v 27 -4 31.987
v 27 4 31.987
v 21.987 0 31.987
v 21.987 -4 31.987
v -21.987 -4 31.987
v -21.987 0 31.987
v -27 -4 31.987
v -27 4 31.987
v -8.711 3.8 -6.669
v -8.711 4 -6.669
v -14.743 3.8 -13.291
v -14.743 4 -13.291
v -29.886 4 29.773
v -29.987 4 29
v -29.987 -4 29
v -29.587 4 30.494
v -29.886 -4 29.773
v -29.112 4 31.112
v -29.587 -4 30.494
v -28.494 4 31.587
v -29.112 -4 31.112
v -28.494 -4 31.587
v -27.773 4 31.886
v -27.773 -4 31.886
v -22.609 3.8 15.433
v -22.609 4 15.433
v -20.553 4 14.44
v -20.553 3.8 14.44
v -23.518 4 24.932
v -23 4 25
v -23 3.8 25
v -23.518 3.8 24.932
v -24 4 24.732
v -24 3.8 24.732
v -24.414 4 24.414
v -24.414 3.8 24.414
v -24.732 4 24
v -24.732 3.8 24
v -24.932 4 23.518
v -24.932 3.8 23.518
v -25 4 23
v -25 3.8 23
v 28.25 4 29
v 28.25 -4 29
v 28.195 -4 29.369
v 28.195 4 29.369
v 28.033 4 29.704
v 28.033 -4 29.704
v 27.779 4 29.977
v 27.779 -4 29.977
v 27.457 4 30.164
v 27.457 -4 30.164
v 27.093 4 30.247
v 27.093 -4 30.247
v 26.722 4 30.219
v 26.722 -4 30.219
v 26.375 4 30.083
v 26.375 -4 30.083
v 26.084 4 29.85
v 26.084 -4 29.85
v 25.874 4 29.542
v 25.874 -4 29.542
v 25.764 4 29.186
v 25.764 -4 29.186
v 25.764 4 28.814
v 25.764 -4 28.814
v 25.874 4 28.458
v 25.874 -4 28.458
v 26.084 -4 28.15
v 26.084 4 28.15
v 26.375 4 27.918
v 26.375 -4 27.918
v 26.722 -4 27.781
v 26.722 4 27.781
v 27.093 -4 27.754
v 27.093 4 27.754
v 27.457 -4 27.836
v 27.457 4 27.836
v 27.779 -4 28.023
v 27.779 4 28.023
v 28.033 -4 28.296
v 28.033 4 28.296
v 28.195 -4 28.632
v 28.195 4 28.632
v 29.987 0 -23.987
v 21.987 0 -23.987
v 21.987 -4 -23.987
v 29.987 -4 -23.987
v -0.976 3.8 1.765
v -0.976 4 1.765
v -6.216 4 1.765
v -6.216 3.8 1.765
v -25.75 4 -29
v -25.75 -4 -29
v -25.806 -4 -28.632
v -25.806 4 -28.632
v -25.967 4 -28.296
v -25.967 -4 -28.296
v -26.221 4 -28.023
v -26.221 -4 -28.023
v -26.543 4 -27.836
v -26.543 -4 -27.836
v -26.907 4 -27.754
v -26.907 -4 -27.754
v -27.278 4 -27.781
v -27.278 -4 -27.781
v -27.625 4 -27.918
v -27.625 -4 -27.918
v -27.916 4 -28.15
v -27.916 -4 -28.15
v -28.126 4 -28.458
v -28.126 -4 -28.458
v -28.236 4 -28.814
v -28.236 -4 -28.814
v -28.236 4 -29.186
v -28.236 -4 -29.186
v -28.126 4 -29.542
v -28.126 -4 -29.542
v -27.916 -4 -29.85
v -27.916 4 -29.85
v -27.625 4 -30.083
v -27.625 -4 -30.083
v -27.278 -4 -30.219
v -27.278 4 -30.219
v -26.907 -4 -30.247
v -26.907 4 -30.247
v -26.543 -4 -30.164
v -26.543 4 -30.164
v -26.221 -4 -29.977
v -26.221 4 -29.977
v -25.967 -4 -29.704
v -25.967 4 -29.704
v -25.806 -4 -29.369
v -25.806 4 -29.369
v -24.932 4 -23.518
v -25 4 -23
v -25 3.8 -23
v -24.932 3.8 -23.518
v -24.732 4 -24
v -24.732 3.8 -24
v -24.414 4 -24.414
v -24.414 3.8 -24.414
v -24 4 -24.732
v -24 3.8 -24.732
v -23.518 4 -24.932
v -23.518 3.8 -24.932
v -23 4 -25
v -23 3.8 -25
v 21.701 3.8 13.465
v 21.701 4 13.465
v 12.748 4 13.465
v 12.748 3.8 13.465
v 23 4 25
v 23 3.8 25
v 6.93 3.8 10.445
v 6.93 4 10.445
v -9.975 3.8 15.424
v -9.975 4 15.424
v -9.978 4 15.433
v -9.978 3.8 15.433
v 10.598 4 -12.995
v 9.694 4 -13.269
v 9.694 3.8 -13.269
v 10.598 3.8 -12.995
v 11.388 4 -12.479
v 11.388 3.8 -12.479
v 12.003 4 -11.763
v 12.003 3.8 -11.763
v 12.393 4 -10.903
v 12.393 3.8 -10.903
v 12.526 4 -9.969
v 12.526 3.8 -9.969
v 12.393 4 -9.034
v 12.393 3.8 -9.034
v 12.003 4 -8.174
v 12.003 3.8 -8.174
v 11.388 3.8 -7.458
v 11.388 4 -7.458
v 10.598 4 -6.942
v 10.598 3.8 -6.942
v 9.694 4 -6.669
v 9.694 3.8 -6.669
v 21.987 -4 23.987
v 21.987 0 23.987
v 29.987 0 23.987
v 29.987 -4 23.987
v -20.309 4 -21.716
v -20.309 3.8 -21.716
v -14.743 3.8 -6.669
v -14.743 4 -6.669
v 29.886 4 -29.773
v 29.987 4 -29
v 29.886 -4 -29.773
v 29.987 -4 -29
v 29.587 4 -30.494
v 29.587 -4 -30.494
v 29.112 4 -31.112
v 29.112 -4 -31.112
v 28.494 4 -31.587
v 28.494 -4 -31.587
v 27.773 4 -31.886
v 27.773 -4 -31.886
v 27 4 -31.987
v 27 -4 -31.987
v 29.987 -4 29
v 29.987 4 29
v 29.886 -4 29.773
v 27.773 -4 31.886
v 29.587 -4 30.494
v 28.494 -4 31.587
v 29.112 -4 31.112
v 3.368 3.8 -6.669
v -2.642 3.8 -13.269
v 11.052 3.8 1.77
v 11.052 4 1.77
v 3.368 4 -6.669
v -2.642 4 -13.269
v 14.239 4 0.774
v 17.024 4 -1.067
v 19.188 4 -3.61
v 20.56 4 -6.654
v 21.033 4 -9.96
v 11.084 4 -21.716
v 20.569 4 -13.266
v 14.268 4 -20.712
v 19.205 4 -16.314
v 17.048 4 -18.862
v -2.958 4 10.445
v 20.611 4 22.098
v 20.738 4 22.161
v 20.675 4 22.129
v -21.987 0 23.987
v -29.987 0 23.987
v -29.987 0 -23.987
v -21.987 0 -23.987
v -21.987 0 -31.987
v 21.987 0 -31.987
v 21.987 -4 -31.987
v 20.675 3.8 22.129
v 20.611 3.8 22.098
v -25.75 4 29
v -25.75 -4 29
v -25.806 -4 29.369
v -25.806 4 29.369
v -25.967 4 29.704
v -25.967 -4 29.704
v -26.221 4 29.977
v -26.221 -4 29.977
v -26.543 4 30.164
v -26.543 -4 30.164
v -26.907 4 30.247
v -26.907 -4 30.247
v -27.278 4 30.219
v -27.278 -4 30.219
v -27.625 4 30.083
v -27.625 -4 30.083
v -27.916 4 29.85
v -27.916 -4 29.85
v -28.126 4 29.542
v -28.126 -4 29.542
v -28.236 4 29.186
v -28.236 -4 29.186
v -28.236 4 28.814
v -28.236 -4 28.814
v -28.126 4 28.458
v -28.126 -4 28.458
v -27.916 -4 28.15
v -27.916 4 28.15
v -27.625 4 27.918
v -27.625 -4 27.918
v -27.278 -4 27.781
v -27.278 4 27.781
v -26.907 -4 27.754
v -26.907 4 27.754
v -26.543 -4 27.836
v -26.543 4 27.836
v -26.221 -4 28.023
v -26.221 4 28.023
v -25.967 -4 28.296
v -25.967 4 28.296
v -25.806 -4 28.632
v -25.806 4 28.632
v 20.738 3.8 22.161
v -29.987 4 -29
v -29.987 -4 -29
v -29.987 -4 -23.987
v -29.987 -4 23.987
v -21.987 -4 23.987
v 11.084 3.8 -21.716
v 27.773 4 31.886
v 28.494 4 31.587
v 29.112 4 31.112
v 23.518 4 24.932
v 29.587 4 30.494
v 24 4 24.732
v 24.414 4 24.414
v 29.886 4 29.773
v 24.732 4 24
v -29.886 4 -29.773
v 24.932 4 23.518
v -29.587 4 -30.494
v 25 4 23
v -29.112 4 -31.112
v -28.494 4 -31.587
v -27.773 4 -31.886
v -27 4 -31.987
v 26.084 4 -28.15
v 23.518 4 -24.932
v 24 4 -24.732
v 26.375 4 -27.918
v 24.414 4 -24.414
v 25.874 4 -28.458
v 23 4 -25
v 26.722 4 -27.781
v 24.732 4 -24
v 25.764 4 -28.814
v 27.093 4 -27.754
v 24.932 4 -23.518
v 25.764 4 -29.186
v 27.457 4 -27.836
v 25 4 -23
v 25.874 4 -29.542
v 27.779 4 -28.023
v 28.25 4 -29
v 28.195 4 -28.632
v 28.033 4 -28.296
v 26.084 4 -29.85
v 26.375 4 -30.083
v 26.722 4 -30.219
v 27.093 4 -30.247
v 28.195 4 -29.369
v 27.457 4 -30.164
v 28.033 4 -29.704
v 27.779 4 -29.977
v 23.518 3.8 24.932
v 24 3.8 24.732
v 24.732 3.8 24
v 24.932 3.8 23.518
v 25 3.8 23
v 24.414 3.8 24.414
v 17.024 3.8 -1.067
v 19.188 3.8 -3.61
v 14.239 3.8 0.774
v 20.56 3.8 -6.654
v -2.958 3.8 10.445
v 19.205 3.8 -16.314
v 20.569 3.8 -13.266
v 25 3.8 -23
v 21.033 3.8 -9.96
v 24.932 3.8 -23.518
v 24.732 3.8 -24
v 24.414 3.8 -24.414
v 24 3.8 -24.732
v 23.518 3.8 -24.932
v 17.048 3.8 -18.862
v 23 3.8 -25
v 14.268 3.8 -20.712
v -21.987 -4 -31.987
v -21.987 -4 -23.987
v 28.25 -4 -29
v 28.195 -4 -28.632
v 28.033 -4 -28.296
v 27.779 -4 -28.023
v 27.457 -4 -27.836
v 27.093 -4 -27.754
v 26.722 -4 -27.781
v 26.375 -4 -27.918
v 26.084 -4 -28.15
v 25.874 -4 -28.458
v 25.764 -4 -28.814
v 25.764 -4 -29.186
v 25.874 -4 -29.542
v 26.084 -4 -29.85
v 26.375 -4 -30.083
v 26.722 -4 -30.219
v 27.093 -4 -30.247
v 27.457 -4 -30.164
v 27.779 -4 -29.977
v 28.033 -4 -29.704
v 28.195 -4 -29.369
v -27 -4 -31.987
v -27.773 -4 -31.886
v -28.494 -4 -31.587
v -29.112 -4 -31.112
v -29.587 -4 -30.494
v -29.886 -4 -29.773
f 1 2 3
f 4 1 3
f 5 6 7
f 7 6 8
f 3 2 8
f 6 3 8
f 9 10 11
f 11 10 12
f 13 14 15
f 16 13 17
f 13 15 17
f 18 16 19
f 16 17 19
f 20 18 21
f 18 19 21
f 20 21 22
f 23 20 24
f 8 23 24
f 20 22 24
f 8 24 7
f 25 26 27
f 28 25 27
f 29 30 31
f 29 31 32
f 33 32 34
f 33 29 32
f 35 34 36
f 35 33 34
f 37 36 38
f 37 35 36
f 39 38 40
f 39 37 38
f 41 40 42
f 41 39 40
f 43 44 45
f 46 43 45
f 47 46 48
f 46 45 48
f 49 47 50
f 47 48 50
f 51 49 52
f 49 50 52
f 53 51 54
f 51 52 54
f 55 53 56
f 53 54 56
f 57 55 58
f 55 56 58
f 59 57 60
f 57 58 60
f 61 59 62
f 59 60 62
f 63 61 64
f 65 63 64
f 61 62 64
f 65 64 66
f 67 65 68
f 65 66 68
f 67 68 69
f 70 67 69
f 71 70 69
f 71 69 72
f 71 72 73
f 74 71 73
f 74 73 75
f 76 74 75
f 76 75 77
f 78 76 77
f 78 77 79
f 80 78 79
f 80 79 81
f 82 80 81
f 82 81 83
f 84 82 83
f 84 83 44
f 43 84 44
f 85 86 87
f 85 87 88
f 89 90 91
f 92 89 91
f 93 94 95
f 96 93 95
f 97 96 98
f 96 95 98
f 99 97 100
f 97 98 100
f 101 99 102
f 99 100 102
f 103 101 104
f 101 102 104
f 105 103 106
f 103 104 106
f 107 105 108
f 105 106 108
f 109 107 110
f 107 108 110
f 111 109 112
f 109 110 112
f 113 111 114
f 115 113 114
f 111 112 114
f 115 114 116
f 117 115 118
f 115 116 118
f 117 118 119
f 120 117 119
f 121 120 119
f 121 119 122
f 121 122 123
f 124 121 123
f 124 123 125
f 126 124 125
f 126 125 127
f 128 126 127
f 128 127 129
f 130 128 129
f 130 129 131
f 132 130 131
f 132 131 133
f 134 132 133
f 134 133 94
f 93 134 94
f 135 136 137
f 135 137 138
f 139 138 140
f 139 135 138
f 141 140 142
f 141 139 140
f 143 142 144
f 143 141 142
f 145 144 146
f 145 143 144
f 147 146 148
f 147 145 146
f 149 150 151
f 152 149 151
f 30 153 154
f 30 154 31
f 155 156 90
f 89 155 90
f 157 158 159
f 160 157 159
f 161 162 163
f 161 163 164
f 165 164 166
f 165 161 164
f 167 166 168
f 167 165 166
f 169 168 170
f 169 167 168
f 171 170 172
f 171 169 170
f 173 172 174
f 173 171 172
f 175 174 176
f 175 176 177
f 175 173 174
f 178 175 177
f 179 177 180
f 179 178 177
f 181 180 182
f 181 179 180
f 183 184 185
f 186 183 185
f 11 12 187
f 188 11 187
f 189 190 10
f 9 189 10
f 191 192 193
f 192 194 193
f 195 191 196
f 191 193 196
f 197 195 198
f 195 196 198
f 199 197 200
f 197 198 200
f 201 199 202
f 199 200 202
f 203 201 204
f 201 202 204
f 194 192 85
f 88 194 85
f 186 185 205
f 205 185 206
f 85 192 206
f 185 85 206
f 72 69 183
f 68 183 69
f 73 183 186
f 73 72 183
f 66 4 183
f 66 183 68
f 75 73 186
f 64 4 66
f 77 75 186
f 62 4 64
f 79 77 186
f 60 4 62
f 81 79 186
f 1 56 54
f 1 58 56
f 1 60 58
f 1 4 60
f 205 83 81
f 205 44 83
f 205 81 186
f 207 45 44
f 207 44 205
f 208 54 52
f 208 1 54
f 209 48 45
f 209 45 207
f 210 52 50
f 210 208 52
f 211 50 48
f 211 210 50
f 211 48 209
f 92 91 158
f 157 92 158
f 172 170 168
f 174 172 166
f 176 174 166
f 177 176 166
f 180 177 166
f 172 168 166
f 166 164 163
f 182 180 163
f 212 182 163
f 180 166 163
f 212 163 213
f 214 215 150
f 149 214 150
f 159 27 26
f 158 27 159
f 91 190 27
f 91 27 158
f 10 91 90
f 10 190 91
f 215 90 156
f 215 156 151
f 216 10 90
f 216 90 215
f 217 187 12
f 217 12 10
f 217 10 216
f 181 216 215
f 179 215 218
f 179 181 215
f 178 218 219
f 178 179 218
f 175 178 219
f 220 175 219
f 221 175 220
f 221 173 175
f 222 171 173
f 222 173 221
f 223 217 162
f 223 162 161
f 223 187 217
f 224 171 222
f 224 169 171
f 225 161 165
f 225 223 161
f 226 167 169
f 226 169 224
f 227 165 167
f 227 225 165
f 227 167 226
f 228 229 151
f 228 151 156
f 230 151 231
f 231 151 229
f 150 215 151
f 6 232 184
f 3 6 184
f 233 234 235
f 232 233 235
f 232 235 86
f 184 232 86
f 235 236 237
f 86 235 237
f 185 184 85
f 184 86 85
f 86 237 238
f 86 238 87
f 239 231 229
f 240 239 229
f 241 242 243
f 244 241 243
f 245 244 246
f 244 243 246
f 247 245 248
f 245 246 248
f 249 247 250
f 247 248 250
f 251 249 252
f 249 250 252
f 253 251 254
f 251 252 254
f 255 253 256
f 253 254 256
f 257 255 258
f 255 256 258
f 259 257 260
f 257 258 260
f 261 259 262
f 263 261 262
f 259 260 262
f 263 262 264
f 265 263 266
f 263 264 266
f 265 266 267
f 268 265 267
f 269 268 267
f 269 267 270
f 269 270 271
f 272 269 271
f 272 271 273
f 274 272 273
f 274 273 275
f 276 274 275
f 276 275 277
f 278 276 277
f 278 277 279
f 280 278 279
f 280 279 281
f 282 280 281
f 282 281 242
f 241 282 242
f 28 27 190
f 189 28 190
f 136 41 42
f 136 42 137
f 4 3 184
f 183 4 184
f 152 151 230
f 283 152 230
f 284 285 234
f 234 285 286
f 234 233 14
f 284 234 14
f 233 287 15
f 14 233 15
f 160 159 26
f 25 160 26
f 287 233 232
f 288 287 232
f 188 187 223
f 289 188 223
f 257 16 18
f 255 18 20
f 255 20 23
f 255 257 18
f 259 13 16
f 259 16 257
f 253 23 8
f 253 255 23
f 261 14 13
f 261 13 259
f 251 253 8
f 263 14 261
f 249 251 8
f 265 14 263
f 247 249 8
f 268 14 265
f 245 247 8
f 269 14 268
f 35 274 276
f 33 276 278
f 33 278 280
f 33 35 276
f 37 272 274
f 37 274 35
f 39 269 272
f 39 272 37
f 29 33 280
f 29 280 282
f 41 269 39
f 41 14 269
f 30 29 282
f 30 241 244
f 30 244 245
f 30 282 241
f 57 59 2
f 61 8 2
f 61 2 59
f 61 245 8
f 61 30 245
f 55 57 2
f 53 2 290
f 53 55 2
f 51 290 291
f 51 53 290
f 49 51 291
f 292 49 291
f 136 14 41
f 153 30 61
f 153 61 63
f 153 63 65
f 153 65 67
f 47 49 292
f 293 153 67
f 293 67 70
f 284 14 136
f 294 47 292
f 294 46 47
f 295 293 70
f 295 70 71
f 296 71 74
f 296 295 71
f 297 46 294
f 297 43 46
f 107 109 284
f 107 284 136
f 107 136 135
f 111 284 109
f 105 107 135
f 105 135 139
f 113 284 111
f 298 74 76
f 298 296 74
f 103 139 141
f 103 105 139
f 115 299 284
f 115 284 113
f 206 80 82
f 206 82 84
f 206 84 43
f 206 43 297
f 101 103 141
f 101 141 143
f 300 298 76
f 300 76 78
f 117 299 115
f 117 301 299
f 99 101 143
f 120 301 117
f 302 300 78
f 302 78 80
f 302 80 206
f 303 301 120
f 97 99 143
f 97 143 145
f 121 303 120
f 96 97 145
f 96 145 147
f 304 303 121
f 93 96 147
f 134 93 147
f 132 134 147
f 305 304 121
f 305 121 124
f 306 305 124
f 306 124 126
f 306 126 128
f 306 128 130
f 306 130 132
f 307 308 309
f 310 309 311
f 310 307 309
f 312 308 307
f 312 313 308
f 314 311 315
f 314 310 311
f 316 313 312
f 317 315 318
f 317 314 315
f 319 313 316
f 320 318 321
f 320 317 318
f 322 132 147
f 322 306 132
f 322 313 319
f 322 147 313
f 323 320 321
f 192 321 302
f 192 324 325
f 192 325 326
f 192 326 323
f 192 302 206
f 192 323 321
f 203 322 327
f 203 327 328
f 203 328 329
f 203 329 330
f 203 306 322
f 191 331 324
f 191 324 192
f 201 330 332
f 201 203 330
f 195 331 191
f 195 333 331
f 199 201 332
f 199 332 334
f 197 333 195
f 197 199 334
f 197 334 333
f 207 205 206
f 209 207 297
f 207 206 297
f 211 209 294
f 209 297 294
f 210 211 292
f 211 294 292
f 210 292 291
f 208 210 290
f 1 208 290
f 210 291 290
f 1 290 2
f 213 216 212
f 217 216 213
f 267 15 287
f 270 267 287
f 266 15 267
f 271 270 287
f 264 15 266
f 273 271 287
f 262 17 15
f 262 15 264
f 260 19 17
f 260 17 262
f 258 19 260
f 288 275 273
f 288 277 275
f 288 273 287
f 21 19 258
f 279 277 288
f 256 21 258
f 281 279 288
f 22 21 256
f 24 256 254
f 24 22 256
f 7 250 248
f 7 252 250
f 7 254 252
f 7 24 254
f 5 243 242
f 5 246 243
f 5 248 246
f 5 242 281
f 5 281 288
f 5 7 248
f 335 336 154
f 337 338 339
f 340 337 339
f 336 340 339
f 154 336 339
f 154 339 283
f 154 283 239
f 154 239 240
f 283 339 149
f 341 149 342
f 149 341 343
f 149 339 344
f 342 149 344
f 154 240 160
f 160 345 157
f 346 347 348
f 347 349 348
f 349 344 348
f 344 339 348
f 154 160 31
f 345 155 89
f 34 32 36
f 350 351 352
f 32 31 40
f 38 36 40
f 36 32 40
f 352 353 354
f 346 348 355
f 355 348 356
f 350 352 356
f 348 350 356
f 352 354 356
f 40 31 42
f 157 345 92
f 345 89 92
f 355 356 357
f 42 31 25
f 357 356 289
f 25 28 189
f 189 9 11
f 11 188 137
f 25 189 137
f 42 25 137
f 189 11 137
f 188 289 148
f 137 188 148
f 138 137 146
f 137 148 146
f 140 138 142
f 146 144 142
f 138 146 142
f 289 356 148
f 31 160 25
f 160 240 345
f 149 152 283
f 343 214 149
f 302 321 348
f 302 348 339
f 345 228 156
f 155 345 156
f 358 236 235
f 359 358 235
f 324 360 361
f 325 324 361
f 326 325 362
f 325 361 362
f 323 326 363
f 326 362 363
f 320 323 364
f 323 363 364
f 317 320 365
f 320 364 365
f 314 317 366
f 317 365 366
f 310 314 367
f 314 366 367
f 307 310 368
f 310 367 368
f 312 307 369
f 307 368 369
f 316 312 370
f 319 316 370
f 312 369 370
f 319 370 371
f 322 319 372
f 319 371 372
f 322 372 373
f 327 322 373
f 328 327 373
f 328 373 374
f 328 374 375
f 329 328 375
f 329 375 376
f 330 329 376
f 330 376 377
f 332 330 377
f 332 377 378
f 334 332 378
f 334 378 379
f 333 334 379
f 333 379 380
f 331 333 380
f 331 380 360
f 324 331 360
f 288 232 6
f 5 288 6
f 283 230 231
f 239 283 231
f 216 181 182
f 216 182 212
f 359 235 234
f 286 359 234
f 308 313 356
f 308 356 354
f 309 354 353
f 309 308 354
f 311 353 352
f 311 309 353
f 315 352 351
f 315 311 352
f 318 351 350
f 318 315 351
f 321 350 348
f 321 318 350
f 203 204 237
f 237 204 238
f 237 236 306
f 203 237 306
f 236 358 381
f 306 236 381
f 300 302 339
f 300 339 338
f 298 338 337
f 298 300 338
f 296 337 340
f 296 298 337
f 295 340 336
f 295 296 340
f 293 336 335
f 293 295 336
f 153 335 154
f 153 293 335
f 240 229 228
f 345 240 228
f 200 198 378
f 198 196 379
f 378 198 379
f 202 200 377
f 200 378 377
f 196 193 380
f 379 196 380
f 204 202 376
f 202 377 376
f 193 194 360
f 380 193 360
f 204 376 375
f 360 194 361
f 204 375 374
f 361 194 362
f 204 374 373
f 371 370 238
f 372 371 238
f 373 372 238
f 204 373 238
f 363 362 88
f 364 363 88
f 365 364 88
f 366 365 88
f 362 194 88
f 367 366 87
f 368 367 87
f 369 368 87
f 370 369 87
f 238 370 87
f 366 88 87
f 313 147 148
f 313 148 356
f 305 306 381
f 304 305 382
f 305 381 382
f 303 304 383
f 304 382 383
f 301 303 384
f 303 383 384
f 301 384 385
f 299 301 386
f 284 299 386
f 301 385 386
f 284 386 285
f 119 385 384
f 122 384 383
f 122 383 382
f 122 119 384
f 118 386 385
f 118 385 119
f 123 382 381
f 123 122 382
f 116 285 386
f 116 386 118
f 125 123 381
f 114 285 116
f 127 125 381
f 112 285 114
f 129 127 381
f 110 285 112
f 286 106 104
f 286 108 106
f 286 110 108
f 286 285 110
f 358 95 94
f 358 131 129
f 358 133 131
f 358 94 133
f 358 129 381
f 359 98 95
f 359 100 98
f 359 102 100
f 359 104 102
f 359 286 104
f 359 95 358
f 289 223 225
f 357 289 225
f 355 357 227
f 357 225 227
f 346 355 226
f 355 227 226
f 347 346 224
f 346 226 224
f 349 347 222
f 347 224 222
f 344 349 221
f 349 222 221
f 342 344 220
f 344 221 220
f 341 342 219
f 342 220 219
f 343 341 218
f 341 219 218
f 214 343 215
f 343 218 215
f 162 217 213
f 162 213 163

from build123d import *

# Parameters (mm, degrees)
EXTRUDE_1_DEPTH     = 4
EXTRUDE_2_DEPTH     = 4
SKETCH_3_R          = 1.25
CUT_EXTRUDE_1_DEPTH = 15
CUT_EXTRUDE_2_DEPTH = 0.2


with BuildPart() as part:
    # 草图1 → 凸台-拉伸1 (new body)
    with BuildSketch(Plane(origin=(0, 0, 0), x_dir=(1, 0, 0), z_dir=(0, 1, 0))):
        with BuildLine():
            Line((-27.00005461, -31.987363475), (27.00005461, -31.987363475))
            ThreePointArc((27.00005461, -31.987363475), (29.112398272, -31.112402082), (29.987359665, -29.00005842))
            Line((29.987359665, -29.00005842), (29.987359665, 29.00005842))
            ThreePointArc((29.987359665, 29.00005842), (29.112398272, 31.112402082), (27.00005461, 31.987363475))
            Line((27.00005461, 31.987363475), (-27.00005461, 31.987363475))
            ThreePointArc((-27.00005461, 31.987363475), (-29.112398272, 31.112402082), (-29.987359665, 29.00005842))
            Line((-29.987359665, 29.00005842), (-29.987359665, -29.00005842))
            ThreePointArc((-29.987359665, -29.00005842), (-29.112398272, -31.112402082), (-27.00005461, -31.987363475))
        make_face()
    extrude(amount=EXTRUDE_1_DEPTH)

    # 草图2 → 凸台-拉伸2 (add)
    with BuildSketch(Plane.XZ):
        with BuildLine():
            Line((21.987359665, 23.987363475), (29.987359665, 23.987363475))
            Line((29.987359665, 23.987363475), (29.987359665, 29.00005842))
            ThreePointArc((29.987359665, 29.00005842), (29.112398272, 31.112402082), (27.00005461, 31.987363475))
            Line((27.00005461, 31.987363475), (21.987359665, 31.987363475))
            Line((21.987359665, 31.987363475), (21.987359665, 23.987363475))
        make_face()
        with BuildLine():
            Line((27.00005461, -31.987363475), (21.987359665, -31.987363475))
            Line((21.987359665, -31.987363475), (21.987359665, -23.987363475))
            Line((21.987359665, -23.987363475), (29.987359665, -23.987363475))
            Line((29.987359665, -23.987363475), (29.987359665, -29.00005842))
            ThreePointArc((29.987359665, -29.00005842), (29.112398272, -31.112402082), (27.00005461, -31.987363475))
        make_face()
        with BuildLine():
            Line((-21.987359665, 23.987363475), (-21.987359665, 31.987363475))
            Line((-21.987359665, 31.987363475), (-27.00005461, 31.987363475))
            ThreePointArc((-27.00005461, 31.987363475), (-29.112398272, 31.112402082), (-29.987359665, 29.00005842))
            Line((-29.987359665, 29.00005842), (-29.987359665, 23.987363475))
            Line((-29.987359665, 23.987363475), (-21.987359665, 23.987363475))
        make_face()
        with BuildLine():
            Line((-29.987359665, -23.987363475), (-29.987359665, -29.00005842))
            ThreePointArc((-29.987359665, -29.00005842), (-29.112398272, -31.112402082), (-27.00005461, -31.987363475))
            Line((-27.00005461, -31.987363475), (-21.987359665, -31.987363475))
            Line((-21.987359665, -31.987363475), (-21.987359665, -23.987363475))
            Line((-21.987359665, -23.987363475), (-29.987359665, -23.987363475))
        make_face()
    extrude(amount=EXTRUDE_2_DEPTH)

    # 草图3 → 切除-拉伸1 (cut)
    with BuildSketch(Plane.XZ.offset(4)):
        with Locations((-27.00005461, 29.00005842)):
            Circle(SKETCH_3_R)
        with Locations((27.00005461, 29.00005842)):
            Circle(SKETCH_3_R)
        with Locations((27.00005461, -29.00005842)):
            Circle(SKETCH_3_R)
        with Locations((-27.00005461, -29.00005842)):
            Circle(SKETCH_3_R)
    extrude(amount=-CUT_EXTRUDE_1_DEPTH, mode=Mode.SUBTRACT)

    # 草图5 → 切除-拉伸2 (cut)
    with BuildSketch(Plane(origin=(0, 4, 0), x_dir=(1, 0, 0), z_dir=(0, 1, 0))):
        with BuildLine():
            Line((-23, 25), (23, 25))
            ThreePointArc((23, 25), (24.414213562, 24.414213562), (25, 23))
            Line((25, 23), (25, -23))
            ThreePointArc((25, -23), (24.414213562, -24.414213562), (23, -25))
            Line((23, -25), (-23, -25))
            ThreePointArc((-23, -25), (-24.414213562, -24.414213562), (-25, -23))
            Line((-25, -23), (-25, 23))
            ThreePointArc((-25, 23), (-24.414213562, 24.414213562), (-23, 25))
        make_face()
        with BuildLine():
            Line((-20.309132479, 21.7161472), (11.083615015, 21.7161472))
            ThreePointArc((11.083615015, 21.7161472), (21.032992317, 9.959590783), (11.052213822, -1.770319196))
            Line((11.052213822, -1.770319196), (21.701392553, -13.464868734))
            Line((21.701392553, -13.464868734), (12.747815073, -13.464868734))
            Line((12.747815073, -13.464868734), (20.738271333, -22.160710638))
            Line((20.738271333, -22.160710638), (20.674664, -22.129263034))
            Line((20.674664, -22.129263034), (20.610679736, -22.097629074))
            Line((20.610679736, -22.097629074), (-2.958144095, -10.445151208))
            Line((-2.958144095, -10.445151208), (6.929882372, -10.445151208))
            Line((6.929882372, -10.445151208), (-0.976260078, -1.765140225))
            Line((-0.976260078, -1.765140225), (-6.216100572, -1.765140225))
            Line((-6.216100572, -1.765140225), (-9.975490326, -15.423548609))
            Line((-9.975490326, -15.423548609), (-9.977986633, -15.432618054))
            Line((-9.977986633, -15.432618054), (-22.608758584, -15.432618054))
            Line((-22.608758584, -15.432618054), (-20.552621384, -14.439759274))
            Line((-20.552621384, -14.439759274), (-14.742658641, 6.668678272))
            Line((-14.742658641, 6.668678272), (-8.710796679, 6.668678272))
            Line((-8.710796679, 6.668678272), (-14.742658641, 13.290950565))
            Line((-14.742658641, 13.290950565), (-20.309132479, 21.7161472))
        make_face(mode=Mode.SUBTRACT)
        with BuildLine():
            Line((3.367574747, 6.668678272), (-2.642308815, 13.268518768))
            Line((-2.642308815, 13.268518768), (9.694238704, 13.268518768))
            ThreePointArc((9.694238704, 13.268518768), (12.526480913, 9.96859852), (9.694238704, 6.668678272))
            Line((9.694238704, 6.668678272), (3.367574747, 6.668678272))
        make_face()
    extrude(amount=-CUT_EXTRUDE_2_DEPTH, mode=Mode.SUBTRACT)


solid = part.part
